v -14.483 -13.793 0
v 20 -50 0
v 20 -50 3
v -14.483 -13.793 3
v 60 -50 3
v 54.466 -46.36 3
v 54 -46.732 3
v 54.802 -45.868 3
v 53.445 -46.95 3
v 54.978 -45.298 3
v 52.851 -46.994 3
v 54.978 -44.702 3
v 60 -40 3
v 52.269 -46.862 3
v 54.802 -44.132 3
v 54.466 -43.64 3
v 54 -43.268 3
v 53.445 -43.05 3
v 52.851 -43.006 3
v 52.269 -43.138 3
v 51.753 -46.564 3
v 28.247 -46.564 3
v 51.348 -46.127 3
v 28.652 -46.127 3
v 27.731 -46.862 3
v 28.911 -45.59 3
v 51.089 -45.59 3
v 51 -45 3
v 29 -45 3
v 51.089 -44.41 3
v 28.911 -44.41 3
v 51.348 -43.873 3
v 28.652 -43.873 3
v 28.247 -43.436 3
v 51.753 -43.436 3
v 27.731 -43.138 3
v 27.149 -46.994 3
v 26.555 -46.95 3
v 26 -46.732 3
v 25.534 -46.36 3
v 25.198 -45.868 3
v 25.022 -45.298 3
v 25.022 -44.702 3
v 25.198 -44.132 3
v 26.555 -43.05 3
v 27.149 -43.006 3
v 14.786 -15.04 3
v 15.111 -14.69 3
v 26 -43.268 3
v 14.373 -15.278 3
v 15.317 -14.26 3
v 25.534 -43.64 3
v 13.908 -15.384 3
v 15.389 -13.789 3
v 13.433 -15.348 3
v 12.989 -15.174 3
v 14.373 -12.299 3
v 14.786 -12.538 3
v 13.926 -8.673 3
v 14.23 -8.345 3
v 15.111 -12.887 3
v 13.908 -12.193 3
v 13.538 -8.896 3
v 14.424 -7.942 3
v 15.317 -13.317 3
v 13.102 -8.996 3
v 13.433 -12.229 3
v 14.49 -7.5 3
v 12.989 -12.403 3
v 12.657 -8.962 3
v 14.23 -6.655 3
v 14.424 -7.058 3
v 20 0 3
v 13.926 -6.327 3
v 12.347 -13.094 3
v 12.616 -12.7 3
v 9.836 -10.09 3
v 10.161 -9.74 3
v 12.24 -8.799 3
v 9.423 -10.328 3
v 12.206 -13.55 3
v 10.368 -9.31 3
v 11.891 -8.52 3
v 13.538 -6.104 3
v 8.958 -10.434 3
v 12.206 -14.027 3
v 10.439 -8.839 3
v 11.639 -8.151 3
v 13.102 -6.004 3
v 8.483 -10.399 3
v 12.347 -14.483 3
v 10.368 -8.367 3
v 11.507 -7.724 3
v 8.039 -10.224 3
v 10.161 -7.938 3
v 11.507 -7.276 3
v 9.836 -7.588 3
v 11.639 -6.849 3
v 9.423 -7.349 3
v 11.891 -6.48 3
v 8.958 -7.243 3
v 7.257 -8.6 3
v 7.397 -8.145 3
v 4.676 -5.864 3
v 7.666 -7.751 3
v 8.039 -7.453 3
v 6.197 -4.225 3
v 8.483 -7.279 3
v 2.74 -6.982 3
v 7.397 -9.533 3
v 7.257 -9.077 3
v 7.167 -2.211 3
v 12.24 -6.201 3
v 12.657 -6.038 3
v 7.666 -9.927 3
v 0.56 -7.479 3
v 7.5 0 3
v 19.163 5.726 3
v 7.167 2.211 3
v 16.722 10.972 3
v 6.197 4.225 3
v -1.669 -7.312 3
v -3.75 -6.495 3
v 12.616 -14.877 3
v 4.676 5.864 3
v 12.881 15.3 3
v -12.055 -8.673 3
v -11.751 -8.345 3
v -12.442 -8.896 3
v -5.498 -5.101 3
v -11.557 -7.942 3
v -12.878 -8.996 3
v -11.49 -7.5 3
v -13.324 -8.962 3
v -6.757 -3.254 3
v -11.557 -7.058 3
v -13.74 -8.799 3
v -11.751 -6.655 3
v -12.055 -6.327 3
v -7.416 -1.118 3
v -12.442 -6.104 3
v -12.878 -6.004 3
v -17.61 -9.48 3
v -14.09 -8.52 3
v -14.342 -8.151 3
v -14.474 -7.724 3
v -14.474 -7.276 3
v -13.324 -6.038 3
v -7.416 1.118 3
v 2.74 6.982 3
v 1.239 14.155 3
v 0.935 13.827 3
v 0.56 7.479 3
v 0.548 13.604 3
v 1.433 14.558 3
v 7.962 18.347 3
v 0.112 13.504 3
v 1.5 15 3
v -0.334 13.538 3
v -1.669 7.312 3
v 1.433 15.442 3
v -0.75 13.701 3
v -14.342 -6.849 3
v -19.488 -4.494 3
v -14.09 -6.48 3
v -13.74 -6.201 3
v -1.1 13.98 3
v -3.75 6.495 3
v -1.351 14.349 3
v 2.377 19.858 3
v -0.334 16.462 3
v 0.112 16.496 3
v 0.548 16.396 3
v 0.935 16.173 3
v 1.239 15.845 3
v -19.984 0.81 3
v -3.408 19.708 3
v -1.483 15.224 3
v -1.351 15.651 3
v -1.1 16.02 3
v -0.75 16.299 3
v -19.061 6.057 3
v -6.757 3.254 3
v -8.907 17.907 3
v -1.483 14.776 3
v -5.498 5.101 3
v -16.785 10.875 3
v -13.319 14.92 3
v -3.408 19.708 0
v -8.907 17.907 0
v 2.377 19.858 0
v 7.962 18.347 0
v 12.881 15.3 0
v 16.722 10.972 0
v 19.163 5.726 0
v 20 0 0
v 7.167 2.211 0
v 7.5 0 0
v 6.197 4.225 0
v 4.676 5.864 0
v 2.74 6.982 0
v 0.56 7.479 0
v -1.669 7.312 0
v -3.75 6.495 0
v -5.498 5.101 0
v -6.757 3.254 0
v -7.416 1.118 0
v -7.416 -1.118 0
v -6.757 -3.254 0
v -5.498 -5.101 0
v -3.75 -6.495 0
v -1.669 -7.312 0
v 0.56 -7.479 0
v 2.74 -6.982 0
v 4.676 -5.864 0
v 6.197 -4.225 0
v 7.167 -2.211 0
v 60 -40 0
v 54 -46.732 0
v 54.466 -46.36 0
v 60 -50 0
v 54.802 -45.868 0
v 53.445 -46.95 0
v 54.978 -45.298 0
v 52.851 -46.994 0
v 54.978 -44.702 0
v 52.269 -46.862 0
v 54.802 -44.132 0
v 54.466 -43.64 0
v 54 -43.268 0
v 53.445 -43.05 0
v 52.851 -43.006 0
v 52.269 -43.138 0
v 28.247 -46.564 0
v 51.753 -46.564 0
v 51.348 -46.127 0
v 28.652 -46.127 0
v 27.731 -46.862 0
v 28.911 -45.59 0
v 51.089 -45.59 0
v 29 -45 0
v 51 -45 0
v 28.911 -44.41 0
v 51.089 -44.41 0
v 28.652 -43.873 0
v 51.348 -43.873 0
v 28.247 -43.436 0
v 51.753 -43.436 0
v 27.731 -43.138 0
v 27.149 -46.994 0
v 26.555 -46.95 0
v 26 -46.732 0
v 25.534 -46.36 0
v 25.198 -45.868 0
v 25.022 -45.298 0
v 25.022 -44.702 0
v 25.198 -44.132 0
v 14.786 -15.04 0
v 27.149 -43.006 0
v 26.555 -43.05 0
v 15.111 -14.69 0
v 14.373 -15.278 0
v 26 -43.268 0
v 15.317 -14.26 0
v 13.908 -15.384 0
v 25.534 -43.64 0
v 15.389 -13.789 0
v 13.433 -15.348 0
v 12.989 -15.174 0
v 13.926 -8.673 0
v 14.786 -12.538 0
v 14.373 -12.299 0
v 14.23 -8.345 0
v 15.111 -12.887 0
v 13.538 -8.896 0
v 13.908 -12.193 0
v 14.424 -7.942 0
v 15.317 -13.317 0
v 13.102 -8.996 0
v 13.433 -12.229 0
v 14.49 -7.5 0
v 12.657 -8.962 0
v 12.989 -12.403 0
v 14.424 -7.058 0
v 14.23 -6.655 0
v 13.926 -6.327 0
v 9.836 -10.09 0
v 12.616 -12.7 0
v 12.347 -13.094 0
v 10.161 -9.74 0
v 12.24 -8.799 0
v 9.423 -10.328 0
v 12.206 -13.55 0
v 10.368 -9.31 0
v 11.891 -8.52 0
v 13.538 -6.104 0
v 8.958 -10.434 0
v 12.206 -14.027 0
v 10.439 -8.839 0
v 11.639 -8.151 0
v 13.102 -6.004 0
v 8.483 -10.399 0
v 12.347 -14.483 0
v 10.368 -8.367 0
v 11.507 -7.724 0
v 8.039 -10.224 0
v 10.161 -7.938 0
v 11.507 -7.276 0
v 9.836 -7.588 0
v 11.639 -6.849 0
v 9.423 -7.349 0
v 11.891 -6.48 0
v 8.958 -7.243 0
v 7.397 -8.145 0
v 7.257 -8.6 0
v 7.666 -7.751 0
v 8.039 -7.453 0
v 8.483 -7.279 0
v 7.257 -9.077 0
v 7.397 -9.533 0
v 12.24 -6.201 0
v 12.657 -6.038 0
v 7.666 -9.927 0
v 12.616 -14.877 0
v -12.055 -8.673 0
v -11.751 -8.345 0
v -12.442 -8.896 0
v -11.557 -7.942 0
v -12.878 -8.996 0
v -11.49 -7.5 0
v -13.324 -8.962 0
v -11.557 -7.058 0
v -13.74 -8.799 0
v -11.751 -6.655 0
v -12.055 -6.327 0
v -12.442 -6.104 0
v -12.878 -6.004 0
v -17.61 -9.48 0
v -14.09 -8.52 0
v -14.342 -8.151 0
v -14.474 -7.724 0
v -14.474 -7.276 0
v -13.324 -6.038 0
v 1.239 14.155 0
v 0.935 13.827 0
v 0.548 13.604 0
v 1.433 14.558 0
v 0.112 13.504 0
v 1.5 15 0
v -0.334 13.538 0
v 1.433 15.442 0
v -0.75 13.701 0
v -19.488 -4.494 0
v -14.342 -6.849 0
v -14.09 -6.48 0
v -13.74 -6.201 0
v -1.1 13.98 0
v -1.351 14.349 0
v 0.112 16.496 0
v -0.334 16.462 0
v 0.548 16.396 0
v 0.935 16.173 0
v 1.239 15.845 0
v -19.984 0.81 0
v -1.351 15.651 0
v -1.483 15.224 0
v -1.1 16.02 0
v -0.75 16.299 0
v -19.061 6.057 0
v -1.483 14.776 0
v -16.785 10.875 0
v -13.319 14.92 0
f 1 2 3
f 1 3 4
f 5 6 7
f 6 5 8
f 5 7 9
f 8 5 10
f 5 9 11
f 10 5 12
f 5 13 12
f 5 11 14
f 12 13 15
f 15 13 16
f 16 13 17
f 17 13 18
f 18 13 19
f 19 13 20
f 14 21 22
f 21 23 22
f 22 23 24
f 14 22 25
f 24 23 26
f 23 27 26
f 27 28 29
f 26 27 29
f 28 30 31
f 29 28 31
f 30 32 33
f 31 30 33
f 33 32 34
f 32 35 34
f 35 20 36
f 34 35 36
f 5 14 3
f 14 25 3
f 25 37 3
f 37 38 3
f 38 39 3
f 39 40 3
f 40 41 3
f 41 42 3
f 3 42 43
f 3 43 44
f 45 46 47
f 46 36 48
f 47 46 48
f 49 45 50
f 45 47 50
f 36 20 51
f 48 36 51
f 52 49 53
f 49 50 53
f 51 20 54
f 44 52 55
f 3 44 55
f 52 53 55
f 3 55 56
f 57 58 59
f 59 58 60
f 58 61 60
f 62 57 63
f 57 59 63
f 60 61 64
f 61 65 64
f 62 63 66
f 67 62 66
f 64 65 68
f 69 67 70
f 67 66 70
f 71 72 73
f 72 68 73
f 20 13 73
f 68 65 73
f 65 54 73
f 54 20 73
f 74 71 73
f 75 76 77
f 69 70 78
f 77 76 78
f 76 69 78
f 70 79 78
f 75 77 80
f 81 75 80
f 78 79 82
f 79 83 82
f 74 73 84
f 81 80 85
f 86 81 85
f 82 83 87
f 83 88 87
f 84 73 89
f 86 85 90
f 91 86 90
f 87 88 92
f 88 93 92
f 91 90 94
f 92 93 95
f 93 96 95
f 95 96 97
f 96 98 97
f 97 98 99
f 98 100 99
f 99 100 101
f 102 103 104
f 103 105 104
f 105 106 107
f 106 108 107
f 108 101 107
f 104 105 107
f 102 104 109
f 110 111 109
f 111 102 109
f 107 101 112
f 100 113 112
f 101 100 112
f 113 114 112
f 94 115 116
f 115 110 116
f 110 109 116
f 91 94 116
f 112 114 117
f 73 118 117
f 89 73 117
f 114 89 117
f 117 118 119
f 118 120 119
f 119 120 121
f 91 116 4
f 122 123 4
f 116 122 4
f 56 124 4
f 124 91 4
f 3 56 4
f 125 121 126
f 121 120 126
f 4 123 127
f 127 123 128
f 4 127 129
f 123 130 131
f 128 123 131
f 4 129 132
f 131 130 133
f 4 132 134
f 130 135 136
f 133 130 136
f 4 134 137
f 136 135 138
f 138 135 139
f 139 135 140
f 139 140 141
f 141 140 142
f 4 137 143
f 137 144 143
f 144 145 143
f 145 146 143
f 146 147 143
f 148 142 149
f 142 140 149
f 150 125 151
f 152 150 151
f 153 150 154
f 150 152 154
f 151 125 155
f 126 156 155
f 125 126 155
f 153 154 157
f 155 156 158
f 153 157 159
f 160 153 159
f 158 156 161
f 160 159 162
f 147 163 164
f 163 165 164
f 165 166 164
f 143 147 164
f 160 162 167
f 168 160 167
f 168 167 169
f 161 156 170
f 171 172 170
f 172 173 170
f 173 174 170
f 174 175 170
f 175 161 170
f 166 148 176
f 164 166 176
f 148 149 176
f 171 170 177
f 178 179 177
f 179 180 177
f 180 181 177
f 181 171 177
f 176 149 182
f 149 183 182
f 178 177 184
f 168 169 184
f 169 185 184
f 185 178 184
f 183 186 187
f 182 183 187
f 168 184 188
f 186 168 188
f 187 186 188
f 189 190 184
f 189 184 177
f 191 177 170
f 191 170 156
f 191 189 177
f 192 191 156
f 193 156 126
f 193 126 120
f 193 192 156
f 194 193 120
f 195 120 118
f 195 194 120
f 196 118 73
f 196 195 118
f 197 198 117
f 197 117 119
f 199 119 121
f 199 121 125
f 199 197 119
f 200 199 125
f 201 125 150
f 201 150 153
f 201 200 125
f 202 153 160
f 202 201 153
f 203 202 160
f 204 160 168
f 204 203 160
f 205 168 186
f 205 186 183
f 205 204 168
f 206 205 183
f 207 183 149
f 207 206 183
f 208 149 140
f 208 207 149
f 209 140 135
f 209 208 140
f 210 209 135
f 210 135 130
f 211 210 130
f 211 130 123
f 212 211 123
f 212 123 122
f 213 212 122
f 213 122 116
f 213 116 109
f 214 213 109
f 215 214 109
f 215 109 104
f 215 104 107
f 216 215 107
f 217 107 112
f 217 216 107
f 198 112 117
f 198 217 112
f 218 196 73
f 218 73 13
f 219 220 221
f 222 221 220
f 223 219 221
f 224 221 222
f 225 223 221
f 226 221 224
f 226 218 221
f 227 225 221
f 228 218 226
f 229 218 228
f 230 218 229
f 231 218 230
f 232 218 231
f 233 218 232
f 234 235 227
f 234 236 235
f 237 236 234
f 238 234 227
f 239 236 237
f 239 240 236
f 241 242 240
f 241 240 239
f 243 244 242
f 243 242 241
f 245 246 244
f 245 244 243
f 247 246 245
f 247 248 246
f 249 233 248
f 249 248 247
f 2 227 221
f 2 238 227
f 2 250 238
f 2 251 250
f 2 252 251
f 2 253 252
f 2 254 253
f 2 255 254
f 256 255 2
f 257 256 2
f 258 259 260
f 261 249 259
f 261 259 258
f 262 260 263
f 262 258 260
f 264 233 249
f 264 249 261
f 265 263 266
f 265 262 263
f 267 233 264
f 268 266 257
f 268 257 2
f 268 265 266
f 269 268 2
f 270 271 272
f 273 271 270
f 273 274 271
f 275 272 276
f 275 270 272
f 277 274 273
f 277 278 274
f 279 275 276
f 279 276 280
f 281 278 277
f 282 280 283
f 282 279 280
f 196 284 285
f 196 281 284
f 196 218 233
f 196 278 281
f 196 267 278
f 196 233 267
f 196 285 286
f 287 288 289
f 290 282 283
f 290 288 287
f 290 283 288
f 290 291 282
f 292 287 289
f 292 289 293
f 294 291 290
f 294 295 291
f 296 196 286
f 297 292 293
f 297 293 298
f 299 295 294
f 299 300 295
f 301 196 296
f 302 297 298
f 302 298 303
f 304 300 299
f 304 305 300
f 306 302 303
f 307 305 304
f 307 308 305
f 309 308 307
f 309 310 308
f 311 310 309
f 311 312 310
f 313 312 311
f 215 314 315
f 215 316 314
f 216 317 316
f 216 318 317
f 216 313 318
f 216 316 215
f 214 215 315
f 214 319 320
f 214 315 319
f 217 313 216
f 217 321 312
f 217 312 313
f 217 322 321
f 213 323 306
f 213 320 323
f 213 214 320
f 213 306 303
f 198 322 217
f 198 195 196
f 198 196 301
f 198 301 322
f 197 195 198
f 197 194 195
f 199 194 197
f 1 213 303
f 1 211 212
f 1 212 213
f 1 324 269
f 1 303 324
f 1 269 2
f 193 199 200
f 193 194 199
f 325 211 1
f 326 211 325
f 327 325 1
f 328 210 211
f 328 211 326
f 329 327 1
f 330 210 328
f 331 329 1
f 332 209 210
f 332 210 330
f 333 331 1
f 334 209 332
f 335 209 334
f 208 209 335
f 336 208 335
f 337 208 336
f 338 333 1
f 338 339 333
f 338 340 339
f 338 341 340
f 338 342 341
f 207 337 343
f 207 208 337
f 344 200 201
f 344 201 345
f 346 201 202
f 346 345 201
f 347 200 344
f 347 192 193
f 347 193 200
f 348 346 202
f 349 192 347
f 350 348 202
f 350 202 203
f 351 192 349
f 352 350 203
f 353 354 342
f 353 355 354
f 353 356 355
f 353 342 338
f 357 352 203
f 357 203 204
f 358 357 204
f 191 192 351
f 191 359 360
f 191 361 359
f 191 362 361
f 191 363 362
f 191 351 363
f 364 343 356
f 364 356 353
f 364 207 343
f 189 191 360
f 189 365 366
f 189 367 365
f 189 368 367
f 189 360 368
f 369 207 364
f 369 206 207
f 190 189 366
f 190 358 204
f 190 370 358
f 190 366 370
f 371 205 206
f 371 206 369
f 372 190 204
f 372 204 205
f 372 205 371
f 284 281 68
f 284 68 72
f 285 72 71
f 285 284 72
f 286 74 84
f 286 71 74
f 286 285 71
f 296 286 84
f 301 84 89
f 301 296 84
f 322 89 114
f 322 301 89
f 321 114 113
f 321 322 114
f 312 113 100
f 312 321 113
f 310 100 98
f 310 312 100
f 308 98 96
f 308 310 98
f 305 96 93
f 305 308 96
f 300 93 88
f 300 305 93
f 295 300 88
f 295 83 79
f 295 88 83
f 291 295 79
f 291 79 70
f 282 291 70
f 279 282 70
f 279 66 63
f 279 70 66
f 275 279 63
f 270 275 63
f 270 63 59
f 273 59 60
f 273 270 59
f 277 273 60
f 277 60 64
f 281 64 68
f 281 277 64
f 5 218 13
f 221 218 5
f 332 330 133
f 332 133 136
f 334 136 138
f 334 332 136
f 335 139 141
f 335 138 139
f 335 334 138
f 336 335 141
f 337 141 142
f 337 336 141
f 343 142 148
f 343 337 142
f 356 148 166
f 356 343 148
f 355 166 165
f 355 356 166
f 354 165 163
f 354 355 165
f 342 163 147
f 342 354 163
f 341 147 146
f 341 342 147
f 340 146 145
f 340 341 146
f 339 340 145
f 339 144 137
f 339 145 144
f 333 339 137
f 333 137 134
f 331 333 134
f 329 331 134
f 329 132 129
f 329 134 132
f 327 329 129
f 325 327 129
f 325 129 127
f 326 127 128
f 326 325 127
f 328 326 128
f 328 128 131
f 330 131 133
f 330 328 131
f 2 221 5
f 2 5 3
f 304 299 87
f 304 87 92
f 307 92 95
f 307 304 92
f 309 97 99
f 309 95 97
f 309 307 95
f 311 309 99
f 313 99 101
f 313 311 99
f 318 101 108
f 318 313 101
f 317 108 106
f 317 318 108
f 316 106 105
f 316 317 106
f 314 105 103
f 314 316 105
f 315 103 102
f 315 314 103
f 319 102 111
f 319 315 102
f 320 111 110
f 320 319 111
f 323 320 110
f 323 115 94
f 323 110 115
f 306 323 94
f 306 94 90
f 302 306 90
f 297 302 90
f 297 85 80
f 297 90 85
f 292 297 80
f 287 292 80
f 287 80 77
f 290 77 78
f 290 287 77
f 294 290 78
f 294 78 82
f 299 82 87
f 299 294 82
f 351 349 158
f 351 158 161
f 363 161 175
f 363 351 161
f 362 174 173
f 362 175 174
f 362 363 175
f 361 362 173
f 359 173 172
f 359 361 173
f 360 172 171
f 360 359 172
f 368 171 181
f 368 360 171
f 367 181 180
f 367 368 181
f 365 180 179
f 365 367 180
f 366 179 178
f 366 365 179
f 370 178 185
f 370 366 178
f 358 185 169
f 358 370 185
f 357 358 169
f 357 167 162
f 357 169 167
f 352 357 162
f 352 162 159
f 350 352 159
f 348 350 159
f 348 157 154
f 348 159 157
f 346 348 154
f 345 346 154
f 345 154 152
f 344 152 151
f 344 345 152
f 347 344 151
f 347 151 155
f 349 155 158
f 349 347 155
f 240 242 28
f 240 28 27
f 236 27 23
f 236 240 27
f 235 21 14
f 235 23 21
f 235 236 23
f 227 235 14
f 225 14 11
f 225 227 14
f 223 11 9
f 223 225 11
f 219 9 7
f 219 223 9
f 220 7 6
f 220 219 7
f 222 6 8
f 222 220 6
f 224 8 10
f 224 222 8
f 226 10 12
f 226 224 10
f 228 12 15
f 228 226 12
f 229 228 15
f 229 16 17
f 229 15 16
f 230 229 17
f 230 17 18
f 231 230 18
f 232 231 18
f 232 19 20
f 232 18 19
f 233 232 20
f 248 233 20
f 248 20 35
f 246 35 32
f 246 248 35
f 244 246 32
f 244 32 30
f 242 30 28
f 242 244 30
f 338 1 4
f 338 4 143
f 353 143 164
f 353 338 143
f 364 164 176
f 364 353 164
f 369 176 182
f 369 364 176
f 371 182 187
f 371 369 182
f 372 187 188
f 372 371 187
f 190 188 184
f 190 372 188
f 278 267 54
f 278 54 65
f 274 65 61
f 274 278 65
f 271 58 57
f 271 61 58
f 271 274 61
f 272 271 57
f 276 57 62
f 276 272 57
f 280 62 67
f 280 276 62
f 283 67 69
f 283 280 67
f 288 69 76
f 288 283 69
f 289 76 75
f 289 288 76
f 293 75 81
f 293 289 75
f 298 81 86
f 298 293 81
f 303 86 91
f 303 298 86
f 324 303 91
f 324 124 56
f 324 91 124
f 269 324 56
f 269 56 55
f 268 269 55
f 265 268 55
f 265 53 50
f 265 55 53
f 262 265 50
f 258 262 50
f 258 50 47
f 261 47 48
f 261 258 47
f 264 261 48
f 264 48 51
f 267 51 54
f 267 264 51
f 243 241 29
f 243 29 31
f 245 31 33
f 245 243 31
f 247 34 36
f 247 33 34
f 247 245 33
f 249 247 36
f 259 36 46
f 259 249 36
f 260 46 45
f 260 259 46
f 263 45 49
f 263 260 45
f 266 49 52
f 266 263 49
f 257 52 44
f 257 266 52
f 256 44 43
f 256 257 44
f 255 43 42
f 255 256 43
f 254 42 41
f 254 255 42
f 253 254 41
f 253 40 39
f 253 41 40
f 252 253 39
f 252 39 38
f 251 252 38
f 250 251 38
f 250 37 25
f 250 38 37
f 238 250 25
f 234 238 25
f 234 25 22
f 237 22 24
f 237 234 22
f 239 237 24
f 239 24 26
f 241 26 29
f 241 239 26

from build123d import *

# Parameters (mm, degrees)
SKETCH1_R               = 7.5
SKETCH1_R_2             = 4
BOSS_EXTRUDE1_DEPTH     = 3
CUT_EXTRUDE1_DEPTH      = 93.175105099
CUT_EXTRUDE1_DEPTH_BACK = 93.175105099
SKETCH2_R               = 1.5
SKETCH2_R_2             = 1.6
CUT_EXTRUDE3_DEPTH      = 93.175105099
CUT_EXTRUDE3_DEPTH_BACK = 93.175105099
SKETCH4_R               = 2
CUT_EXTRUDE4_DEPTH      = 10


with BuildPart() as part:
    # Sketch1 → Boss-Extrude1 (new body)
    with BuildSketch(Plane.XY):
        with BuildLine():
            Line((20, -50), (-14.482758621, -13.793103448))
            ThreePointArc((-14.482758621, -13.793103448), (-19.697630617, 3.464584837), (-8.907060148, 17.907101371))
            Line((-8.907060148, 17.907101371), (60.546469926, 52.453550686))
            ThreePointArc((60.546469926, 52.453550686), (73.60381741, 48.596501346), (70.712169365, 35.292008702))
            Line((70.712169365, 35.292008702), (20, 0))
            Line((20, 0), (60, -40))
            Line((60, -40), (60, -50))
            Line((60, -50), (20, -50))
        make_face()
        Circle(SKETCH1_R, mode=Mode.SUBTRACT)
        with Locations((65, 43.5)):
            Circle(SKETCH1_R_2, mode=Mode.SUBTRACT)
    extrude(amount=BOSS_EXTRUDE1_DEPTH)

    # Sketch2 → Cut-Extrude1 (cut, two sides: drawn at the far end of the back side and taken through both)
    with BuildSketch(Plane.XY.offset(-CUT_EXTRUDE1_DEPTH_BACK)):
        with Locations((0, 15)):
            Circle(SKETCH2_R)
        with Locations((12.990381057, -7.5)):
            Circle(SKETCH2_R)
        with Locations((-12.990381057, -7.5)):
            Circle(SKETCH2_R)
        with Locations((13.788582233, -13.788582233)):
            Circle(SKETCH2_R_2)
        with Locations((8.838834765, -8.838834765)):
            Circle(SKETCH2_R_2)
    extrude(amount=CUT_EXTRUDE1_DEPTH + CUT_EXTRUDE1_DEPTH_BACK, mode=Mode.SUBTRACT)

    # Sketch4 → Cut-Extrude3 (cut, two sides: drawn at the far end of the back side and taken through both)
    with BuildSketch(Plane.XY.offset(-CUT_EXTRUDE3_DEPTH_BACK)):
        with Locations((27, -45)):
            Circle(SKETCH4_R)
        with Locations(Location((53, -45, 0), (0, 0, 180))):
            Circle(SKETCH4_R)
    extrude(amount=CUT_EXTRUDE3_DEPTH + CUT_EXTRUDE3_DEPTH_BACK, mode=Mode.SUBTRACT)

    # Sketch5 → Cut-Extrude4 (cut)
    with BuildSketch(Plane.XY):
        with BuildLine():
            Line((60.546469926, 52.453550686), (-8.907060148, 17.907101371))
            ThreePointArc((-8.907060148, 17.907101371), (10.532302622, 17.002076387), (20, 0))
            Line((20, 0), (70.712169365, 35.292008702))
            ThreePointArc((70.712169365, 35.292008702), (73.60381741, 48.596501346), (60.546469926, 52.453550686))
        make_face()
    extrude(amount=CUT_EXTRUDE4_DEPTH, mode=Mode.SUBTRACT)


solid = part.part
